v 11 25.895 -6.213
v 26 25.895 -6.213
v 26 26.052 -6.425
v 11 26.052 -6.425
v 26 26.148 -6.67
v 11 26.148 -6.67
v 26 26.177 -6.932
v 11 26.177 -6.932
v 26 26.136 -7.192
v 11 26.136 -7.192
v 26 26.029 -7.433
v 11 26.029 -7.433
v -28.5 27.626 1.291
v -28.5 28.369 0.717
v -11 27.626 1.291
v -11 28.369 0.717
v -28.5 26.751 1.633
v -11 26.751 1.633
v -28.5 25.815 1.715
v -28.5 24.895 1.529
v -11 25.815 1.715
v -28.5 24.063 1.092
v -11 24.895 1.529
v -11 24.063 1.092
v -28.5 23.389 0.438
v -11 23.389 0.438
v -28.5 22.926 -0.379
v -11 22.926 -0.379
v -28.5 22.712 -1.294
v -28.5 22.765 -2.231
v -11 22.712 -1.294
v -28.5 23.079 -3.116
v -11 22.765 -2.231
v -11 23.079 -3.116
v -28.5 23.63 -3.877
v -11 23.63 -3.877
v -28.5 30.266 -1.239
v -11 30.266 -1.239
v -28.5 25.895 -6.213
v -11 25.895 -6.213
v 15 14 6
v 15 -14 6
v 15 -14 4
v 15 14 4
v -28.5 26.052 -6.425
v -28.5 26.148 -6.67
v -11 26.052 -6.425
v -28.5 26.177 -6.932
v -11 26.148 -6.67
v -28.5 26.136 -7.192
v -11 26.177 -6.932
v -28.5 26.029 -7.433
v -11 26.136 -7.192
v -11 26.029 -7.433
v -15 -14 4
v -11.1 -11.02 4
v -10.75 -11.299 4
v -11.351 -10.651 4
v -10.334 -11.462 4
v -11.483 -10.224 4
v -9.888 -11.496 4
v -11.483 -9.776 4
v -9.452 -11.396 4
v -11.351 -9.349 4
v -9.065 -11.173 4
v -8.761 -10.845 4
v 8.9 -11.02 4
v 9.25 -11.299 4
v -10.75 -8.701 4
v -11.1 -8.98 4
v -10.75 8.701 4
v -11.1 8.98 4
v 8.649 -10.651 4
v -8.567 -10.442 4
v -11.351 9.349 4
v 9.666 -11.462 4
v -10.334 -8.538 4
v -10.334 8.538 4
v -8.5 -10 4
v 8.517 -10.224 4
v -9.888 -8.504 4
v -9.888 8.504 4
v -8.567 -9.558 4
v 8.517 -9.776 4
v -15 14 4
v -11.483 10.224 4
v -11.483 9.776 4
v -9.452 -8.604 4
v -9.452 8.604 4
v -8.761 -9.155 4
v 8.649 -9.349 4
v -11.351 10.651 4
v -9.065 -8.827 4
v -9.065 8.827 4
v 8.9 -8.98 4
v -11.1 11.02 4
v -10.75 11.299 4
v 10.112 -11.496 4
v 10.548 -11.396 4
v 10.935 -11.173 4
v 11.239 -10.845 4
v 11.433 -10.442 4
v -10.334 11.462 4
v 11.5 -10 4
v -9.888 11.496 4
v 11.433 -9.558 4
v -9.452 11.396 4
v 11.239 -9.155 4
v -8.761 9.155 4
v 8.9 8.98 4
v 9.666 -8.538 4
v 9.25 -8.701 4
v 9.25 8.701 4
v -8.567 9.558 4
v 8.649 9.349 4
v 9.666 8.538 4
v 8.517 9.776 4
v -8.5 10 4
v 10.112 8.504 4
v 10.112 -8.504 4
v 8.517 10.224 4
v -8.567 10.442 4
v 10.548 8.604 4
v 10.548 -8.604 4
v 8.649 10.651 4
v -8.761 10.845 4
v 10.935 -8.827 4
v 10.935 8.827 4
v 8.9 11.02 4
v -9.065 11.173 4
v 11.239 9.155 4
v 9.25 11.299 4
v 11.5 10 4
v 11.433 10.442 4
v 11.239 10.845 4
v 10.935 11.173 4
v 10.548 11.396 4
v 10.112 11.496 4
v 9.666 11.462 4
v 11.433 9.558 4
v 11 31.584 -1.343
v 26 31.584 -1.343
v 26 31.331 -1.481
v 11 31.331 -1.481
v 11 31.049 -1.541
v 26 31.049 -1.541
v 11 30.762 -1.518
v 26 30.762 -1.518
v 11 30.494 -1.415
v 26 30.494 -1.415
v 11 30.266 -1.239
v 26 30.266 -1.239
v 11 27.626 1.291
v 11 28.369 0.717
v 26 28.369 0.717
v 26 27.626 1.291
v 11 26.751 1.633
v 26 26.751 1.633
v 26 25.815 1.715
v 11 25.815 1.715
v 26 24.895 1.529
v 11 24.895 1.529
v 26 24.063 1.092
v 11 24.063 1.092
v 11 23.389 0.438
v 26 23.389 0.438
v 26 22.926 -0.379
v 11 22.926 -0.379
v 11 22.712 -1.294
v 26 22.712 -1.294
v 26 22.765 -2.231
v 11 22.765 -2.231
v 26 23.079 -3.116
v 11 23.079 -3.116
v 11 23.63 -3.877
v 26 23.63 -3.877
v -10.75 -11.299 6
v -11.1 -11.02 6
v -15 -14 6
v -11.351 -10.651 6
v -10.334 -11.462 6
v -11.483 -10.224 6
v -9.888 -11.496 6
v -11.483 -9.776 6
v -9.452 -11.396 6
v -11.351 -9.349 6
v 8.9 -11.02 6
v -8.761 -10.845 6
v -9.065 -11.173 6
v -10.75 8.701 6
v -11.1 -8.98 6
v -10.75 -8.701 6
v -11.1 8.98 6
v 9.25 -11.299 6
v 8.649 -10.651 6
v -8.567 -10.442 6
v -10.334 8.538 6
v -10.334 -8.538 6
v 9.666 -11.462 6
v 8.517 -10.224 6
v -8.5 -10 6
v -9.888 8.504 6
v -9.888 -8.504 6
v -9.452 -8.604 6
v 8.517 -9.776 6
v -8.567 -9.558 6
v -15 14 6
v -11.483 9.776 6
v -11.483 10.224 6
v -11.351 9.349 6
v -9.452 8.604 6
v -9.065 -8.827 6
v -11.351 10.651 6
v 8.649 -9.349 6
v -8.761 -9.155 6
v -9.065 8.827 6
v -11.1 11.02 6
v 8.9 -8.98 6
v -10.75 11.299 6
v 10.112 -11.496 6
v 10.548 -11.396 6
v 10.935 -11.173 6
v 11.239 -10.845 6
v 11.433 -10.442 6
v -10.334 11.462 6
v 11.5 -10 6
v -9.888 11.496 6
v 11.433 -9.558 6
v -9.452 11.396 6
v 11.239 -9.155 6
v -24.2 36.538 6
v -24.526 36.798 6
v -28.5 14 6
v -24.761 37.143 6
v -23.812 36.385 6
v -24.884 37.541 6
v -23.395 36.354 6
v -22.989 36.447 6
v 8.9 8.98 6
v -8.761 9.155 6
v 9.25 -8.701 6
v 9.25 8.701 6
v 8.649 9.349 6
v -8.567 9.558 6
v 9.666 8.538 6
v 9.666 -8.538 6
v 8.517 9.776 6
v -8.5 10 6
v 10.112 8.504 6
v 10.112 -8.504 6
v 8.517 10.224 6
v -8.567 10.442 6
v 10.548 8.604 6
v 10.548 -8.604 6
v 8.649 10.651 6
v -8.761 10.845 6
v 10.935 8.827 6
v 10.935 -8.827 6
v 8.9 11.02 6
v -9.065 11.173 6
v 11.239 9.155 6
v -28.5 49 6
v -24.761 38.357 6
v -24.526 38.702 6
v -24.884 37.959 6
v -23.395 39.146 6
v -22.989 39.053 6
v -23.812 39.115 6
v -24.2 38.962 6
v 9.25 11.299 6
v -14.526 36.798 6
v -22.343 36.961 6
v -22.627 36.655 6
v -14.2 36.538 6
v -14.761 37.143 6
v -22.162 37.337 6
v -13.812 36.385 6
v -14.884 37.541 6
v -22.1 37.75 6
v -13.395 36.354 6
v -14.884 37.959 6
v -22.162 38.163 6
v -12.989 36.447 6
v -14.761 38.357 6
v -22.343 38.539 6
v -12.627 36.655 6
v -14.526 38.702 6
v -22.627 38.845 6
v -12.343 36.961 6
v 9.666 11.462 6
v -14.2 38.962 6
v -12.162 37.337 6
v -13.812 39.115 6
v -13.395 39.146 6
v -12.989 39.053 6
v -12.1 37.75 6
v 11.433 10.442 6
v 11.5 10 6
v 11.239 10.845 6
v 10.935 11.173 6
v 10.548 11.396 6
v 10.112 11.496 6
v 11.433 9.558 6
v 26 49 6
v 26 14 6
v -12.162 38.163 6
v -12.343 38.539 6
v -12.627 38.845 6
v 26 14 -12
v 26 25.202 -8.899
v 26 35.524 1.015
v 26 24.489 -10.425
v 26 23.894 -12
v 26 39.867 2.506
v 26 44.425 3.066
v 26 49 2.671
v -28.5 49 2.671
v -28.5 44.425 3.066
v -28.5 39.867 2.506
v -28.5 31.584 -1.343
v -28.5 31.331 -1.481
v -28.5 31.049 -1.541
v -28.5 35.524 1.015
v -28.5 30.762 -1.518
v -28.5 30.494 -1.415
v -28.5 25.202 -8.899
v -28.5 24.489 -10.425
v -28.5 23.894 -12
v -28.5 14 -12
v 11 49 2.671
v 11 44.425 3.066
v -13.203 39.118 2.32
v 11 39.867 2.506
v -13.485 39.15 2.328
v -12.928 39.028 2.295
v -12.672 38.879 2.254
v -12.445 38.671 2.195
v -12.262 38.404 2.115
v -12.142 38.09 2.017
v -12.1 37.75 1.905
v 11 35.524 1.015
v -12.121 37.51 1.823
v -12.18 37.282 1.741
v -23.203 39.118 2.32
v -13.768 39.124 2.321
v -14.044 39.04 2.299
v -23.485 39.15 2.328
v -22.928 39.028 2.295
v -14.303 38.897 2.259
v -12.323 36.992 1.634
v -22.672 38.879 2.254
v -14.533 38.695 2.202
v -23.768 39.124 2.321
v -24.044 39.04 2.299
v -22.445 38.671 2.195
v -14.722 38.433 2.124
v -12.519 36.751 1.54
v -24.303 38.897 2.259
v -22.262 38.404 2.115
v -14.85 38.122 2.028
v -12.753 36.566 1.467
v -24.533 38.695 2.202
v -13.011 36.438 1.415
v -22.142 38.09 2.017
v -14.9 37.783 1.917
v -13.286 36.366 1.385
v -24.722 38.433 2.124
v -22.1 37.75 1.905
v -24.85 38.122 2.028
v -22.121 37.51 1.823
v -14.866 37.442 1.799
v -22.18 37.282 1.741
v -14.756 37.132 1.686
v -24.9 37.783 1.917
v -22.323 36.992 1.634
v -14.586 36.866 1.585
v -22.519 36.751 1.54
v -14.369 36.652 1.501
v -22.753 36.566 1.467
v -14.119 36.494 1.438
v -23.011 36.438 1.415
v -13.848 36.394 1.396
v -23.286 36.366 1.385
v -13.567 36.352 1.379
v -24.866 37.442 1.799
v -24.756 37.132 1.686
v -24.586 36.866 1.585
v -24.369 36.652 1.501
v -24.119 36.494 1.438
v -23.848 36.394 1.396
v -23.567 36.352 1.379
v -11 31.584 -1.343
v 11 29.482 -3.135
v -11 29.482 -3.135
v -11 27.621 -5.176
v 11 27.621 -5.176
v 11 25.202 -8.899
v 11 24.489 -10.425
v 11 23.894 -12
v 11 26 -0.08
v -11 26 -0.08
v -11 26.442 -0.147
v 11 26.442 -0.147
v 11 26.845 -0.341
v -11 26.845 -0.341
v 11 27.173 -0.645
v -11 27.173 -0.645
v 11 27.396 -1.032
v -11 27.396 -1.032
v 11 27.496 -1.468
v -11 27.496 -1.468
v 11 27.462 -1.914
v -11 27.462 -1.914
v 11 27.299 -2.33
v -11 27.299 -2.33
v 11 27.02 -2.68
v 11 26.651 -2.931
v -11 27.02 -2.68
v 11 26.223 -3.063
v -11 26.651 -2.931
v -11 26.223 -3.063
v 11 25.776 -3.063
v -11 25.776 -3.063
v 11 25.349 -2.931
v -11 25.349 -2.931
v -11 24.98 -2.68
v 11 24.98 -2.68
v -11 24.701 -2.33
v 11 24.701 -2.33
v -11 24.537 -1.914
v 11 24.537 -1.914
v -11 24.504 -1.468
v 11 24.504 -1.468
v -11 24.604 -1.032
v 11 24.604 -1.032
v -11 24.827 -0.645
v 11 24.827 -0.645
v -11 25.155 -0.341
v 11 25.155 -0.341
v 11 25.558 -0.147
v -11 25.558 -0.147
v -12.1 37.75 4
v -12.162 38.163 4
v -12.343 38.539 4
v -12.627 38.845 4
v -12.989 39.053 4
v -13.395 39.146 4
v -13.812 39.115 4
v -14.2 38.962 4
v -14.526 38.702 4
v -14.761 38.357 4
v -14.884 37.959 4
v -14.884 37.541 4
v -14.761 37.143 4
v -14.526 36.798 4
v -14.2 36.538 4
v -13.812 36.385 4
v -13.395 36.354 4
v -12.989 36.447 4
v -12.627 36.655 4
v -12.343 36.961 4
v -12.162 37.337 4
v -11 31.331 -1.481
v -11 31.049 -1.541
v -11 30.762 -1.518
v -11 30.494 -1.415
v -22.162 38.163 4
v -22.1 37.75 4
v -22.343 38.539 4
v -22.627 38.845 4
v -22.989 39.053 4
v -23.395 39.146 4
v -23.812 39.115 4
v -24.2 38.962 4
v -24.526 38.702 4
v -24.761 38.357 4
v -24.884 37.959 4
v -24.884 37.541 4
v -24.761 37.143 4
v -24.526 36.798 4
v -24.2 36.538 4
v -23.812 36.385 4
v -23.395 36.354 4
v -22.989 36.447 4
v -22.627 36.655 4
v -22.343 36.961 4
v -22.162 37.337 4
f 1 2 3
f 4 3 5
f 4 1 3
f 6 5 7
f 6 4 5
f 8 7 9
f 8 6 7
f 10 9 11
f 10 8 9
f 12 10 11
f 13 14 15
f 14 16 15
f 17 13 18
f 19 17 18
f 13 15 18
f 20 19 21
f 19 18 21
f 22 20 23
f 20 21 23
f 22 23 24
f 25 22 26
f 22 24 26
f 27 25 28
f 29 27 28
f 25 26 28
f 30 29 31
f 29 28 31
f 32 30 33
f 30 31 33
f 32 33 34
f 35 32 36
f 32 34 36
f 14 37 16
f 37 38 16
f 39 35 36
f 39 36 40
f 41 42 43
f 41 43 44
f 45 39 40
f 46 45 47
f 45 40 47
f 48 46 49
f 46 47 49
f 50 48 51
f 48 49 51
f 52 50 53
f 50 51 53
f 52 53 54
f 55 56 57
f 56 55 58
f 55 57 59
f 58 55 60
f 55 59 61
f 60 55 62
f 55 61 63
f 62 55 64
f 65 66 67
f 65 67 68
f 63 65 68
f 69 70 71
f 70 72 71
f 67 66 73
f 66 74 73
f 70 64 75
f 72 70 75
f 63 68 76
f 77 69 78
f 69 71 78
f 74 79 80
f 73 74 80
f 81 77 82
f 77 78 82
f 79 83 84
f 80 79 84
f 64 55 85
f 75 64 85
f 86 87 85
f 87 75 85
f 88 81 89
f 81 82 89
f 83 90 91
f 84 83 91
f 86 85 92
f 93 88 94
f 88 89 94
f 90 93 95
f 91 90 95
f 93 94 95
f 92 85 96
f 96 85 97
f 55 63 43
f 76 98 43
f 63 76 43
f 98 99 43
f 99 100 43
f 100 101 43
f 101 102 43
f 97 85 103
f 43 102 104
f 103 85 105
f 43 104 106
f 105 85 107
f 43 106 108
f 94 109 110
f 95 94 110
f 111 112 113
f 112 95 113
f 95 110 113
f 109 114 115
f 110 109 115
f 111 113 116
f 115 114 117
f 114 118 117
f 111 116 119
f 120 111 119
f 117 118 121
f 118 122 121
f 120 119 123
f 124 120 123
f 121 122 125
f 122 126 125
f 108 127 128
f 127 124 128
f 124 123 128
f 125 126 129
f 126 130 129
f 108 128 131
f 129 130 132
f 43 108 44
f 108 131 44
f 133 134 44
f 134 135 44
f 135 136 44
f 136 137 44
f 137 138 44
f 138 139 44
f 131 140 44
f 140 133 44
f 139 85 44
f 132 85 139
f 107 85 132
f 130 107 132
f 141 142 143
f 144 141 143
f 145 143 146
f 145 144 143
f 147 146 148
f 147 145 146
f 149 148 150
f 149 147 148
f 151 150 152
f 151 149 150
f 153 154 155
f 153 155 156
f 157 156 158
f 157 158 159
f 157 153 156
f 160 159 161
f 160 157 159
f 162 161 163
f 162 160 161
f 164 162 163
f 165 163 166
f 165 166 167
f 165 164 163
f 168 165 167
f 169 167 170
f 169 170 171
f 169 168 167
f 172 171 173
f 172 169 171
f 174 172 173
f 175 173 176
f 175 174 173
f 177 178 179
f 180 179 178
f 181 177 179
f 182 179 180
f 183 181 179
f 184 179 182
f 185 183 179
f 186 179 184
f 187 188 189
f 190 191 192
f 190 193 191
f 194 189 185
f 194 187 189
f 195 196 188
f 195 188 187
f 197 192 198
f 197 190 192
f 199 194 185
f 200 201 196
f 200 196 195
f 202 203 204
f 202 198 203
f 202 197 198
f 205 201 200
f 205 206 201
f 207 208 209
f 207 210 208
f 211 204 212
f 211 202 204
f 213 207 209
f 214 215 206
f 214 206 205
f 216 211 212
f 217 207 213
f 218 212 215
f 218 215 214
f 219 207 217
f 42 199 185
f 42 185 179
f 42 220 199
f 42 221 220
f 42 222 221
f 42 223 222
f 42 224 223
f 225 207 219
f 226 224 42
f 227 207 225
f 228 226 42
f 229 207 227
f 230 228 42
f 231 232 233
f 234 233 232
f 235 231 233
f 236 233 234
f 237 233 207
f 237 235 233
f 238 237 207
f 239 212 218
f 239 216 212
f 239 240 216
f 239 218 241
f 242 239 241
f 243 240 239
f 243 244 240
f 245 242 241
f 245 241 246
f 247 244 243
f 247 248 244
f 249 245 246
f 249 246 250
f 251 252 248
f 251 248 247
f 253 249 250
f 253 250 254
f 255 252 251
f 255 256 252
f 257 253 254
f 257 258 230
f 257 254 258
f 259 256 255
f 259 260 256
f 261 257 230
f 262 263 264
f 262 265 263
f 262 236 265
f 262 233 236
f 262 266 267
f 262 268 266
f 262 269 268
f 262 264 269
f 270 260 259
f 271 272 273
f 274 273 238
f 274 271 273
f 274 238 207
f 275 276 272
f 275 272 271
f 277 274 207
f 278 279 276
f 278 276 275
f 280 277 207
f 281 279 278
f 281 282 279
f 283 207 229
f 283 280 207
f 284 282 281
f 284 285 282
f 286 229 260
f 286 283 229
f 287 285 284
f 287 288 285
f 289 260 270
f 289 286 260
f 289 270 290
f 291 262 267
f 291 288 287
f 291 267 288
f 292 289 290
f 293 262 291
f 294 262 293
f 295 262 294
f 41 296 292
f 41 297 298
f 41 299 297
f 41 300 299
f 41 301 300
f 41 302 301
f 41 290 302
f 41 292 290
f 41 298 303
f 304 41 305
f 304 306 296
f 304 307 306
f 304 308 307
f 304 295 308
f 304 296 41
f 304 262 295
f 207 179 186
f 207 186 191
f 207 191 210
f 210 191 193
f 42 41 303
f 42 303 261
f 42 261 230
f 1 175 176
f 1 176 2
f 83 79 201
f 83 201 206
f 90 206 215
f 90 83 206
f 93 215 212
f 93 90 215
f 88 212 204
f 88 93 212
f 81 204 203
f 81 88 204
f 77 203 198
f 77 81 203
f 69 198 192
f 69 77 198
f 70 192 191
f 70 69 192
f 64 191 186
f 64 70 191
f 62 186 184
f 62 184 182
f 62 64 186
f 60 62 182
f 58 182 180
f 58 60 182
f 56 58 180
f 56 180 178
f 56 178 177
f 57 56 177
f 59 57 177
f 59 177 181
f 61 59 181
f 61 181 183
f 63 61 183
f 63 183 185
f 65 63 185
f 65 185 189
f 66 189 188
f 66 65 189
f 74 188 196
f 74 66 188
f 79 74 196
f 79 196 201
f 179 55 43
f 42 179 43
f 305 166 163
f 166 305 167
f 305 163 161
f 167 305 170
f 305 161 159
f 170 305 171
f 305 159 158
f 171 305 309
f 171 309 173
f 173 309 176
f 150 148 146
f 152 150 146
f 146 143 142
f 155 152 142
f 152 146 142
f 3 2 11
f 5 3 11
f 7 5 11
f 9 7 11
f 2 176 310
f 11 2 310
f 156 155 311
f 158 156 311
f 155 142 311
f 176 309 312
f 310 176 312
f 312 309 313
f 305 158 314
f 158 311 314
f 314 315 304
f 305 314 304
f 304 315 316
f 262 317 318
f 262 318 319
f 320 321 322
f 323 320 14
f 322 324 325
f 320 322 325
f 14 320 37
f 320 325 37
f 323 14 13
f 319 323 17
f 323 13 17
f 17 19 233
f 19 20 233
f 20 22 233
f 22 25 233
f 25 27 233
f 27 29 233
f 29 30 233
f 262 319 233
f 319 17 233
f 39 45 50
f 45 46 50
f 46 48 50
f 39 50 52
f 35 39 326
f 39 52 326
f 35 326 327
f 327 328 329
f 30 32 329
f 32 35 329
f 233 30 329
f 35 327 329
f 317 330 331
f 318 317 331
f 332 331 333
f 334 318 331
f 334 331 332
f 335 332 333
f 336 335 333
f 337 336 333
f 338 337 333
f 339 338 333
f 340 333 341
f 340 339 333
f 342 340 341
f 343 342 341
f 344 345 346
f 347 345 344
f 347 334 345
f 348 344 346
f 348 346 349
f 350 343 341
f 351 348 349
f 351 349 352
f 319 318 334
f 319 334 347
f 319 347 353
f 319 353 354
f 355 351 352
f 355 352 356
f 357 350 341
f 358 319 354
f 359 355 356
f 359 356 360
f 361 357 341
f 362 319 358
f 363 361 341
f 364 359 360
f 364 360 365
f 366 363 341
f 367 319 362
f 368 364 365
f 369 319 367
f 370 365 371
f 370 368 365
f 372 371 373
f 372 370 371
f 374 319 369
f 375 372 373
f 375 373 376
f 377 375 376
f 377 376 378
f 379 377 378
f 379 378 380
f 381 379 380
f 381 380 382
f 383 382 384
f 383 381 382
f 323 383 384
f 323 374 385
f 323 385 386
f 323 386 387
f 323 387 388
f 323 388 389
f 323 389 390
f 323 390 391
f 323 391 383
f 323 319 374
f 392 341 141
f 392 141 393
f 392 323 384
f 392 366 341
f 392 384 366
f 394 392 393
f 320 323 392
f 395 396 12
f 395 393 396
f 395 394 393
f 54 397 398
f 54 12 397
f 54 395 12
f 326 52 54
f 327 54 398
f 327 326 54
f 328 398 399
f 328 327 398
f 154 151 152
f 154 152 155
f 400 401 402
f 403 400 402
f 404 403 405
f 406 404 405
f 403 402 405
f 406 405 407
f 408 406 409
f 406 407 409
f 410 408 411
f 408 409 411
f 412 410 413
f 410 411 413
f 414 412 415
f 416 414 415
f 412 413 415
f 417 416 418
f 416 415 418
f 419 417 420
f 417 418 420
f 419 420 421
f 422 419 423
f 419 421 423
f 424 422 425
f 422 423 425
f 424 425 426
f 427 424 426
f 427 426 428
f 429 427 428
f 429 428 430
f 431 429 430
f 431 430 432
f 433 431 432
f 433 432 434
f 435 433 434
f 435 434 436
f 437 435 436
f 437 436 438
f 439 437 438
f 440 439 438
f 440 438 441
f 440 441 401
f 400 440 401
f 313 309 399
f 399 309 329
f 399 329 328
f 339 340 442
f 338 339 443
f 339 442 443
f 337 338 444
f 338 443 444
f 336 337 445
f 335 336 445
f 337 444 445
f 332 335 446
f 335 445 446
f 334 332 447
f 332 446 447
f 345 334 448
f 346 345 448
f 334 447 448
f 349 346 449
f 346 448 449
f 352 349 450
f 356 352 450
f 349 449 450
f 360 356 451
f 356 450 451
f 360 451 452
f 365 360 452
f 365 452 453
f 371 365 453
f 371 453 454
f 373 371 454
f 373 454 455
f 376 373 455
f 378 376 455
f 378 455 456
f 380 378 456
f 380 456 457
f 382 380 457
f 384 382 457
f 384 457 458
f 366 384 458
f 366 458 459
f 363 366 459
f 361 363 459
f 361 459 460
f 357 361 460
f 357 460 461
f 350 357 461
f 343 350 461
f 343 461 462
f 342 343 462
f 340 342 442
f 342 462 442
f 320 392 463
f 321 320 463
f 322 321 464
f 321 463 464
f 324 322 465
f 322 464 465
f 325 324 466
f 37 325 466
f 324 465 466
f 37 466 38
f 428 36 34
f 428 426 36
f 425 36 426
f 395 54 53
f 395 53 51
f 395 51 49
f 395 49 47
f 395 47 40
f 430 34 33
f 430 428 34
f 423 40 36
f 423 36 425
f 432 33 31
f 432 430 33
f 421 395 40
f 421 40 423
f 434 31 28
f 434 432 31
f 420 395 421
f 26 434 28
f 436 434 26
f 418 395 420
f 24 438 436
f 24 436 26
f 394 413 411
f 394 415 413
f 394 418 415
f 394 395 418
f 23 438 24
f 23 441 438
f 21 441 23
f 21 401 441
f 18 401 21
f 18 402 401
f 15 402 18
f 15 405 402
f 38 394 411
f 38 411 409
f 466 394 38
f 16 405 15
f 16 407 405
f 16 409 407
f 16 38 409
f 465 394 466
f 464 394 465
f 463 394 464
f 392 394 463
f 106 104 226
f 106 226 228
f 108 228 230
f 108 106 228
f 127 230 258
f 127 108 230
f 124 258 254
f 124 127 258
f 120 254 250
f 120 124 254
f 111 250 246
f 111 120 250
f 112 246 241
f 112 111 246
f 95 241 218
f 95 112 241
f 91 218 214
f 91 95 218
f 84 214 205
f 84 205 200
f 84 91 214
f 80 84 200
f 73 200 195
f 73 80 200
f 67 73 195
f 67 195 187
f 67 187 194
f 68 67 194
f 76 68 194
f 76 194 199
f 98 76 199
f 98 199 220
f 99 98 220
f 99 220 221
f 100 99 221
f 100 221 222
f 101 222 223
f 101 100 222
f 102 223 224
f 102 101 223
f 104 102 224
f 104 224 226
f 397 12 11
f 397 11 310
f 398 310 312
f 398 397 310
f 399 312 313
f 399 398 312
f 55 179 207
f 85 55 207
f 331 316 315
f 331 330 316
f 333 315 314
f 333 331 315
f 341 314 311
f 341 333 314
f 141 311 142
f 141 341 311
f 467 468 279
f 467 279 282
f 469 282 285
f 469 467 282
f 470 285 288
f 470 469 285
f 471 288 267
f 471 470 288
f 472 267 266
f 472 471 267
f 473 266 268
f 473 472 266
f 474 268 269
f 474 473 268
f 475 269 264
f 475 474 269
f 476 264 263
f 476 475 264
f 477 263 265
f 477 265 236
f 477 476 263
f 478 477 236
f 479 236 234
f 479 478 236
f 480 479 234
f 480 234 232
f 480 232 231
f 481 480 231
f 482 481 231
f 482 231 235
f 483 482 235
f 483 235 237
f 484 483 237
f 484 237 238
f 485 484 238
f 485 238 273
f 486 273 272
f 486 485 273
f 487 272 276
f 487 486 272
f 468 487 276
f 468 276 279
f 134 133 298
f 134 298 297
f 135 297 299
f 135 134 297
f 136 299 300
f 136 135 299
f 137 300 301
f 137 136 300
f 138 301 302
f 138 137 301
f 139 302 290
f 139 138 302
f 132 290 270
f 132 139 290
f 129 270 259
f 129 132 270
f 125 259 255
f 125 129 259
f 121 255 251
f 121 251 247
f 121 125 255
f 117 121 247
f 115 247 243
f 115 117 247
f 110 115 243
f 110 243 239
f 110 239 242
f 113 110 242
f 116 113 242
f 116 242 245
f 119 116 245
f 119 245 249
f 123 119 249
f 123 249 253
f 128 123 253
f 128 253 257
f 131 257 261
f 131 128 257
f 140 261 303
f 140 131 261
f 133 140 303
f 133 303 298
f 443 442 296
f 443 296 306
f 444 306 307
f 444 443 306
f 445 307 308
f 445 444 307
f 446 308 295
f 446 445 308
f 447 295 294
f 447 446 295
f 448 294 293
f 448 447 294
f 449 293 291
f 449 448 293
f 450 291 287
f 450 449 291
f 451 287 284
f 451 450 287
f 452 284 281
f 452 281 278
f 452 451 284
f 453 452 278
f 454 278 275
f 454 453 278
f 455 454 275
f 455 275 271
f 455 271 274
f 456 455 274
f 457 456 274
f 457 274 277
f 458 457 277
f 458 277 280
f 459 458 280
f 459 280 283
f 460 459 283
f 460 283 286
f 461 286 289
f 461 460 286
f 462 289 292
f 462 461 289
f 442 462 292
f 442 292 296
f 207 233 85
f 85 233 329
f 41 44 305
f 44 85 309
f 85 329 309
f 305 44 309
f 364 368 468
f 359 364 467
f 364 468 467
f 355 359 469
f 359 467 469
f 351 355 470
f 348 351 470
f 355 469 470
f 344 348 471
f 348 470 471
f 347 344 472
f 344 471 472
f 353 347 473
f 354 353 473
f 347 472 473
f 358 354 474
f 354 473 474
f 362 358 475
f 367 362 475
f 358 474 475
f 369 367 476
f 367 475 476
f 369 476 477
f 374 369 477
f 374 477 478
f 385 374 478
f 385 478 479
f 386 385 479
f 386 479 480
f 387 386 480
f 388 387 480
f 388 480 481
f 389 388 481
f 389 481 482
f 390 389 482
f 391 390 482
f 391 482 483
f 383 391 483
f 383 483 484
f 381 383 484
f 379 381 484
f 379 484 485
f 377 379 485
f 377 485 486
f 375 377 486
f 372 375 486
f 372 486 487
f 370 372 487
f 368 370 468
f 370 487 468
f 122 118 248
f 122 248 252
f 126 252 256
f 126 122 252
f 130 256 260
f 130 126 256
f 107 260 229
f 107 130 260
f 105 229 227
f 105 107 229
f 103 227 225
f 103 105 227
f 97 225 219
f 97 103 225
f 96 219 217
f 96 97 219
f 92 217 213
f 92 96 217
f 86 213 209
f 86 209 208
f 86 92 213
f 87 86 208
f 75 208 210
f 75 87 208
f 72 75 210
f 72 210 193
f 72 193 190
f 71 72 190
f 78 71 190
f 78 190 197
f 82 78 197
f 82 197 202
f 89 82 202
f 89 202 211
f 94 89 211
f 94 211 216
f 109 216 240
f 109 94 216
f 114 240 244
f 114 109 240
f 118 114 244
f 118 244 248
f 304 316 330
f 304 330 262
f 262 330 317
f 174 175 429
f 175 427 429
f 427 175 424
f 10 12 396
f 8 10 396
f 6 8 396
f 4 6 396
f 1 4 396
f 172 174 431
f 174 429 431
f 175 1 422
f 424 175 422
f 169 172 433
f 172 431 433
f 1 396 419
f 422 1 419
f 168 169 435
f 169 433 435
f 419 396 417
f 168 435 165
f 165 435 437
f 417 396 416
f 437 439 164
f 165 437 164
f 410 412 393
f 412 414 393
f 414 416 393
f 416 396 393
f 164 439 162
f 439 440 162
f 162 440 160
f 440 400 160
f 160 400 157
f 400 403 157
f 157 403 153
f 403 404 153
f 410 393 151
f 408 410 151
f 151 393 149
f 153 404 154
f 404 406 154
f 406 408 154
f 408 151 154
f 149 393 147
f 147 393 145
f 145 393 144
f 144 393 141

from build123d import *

# Parameters (mm, degrees)
SKETCH1_R               = 1.500000001
SKETCH1_R_2             = 1.5
BOSS_EXTRUDE2_DEPTH     = 4
SKETCH1_4_W             = 32
SKETCH1_4_H             = 35
SKETCH1_4_R             = 6.100000001
BOSS_EXTRUDE3_DEPTH     = 20
SKETCH2_R               = 1.5
CUT_EXTRUDE3_DEPTH      = 1
CUT_EXTRUDE3_DEPTH_BACK = 33
CUT_EXTRUDE4_DEPTH      = 5
CUT_EXTRUDE5_START      = -32
CUT_EXTRUDE5_DEPTH      = 5
CUT_EXTRUDE6_DEPTH      = 25
BOSS_EXTRUDE5_DEPTH     = 12.5
SKETCH7_R               = 1.4
CUT_EXTRUDE7_DEPTH      = 20
BOSS_EXTRUDE6_START     = -32
BOSS_EXTRUDE6_DEPTH     = 10
CUT_EXTRUDE8_DEPTH      = 43
SKETCH9_R               = 1.4
SKETCH9_W               = 32
SKETCH9_H               = 28
SKETCH9_R_2             = 1.500000001
BOSS_EXTRUDE7_DEPTH     = 2
SKETCH1_8_W             = 32
SKETCH1_8_H             = 27.5
SKETCH1_8_R             = 1.500000001
SKETCH1_8_R_2           = 1.5
CUT_EXTRUDE9_DEPTH      = 4
SKETCH11_W              = 1
SKETCH11_H              = 28
CUT_EXTRUDE13_DEPTH     = 27
CUT_EXTRUDE10_DEPTH     = 55.5


with BuildPart() as part:
    # Sketch1 → Boss-Extrude2 (new body)
    with BuildSketch(Plane.XY):
        Polygon((-16, 49), (-16, -46.5), (-14.969293645, -46.5), (-14.969293645, -42.160880121), (-15.92820323, -40.5), (-12.464101615, -34.5), (-5.535898385, -34.5), (-2.07179677, -40.5), (-5.535898385, -46.5), (5.535898385, -46.5), (2.090853862, -40.533007852), (5.457729166, -34.432863746), (12.425340481, -34.432863746), (15.909146138, -40.466992148), (15, -42.114193768), (15, -46.5), (16, -46.5), (16, 49), align=None)
        with Locations((10, 10)):
            Circle(SKETCH1_R, mode=Mode.SUBTRACT)
        with Locations((-10, -10)):
            Circle(SKETCH1_R, mode=Mode.SUBTRACT)
        with Locations((10, -10)):
            Circle(SKETCH1_R, mode=Mode.SUBTRACT)
        with Locations((-10, 10)):
            Circle(SKETCH1_R, mode=Mode.SUBTRACT)
        with Locations((0, -43.5)):
            Circle(SKETCH1_R_2, mode=Mode.SUBTRACT)
        with Locations((-8.5, -31.5)):
            Circle(SKETCH1_R_2, mode=Mode.SUBTRACT)
        with Locations((8.5, -31.5)):
            Circle(SKETCH1_R_2, mode=Mode.SUBTRACT)
    extrude(amount=BOSS_EXTRUDE2_DEPTH)

    # Sketch1<4> → Boss-Extrude3 (add)
    with BuildSketch(Plane.XY):
        with Locations((0, 31.5)):
            Rectangle(SKETCH1_4_W, SKETCH1_4_H)
        Polygon((0, 36.969655115), (9.5, 31.484827557), (9.5, 20.515172443), (0, 15.030344885), (-9.5, 20.515172443), (-9.5, 31.484827557), align=None, mode=Mode.SUBTRACT)
        Polygon((9.5, 31.484827557), (9.5, 20.515172443), (0, 15.030344885), (-9.5, 20.515172443), (-9.5, 31.484827557), (0, 36.969655115), align=None)
        with Locations((0, 26)):
            Circle(SKETCH1_4_R, mode=Mode.SUBTRACT)
        with Locations((0, 26)):
            Circle(SKETCH1_4_R)
    extrude(amount=-BOSS_EXTRUDE3_DEPTH)

    # Sketch2 → Cut-Extrude3 (cut, two sides)
    with BuildSketch(Plane.ZY.offset(16)) as cut_extrude3_sk:
        with Locations((-1.580023732, 25.999827557)):
            Circle(SKETCH2_R)
    extrude(amount=CUT_EXTRUDE3_DEPTH, mode=Mode.SUBTRACT)
    extrude(cut_extrude3_sk.sketch, amount=-CUT_EXTRUDE3_DEPTH_BACK, mode=Mode.SUBTRACT)

    # Sketch3 → Cut-Extrude4 (cut)
    with BuildSketch(Plane.ZY.offset(16)):
        with BuildLine():
            Line((0.716979622, 28.369168308), (-1.239134605, 30.265561192))
            ThreePointArc((-1.239134605, 30.265561192), (-1.539975782, 30.904899692), (-1.343104133, 31.583501701))
            ThreePointArc((-1.343104133, 31.583501701), (2.506062966, 39.867185425), (2.670991263, 49))
            Line((2.670991263, 49), (-20, 49))
            Line((-20, 49), (-20, 22.778106647))
            ThreePointArc((-20, 22.778106647), (-13.472070231, 23.458477945), (-7.432949471, 26.028651597))
            ThreePointArc((-7.432949471, 26.028651597), (-6.799957072, 26.171029415), (-6.212814046, 25.894960789))
            Line((-6.212814046, 25.894960789), (-3.877027086, 23.630486807))
            Line((-3.877027086, 23.630486807), (0.716979622, 28.369168308))
        make_face()
        with BuildLine():
            ThreePointArc((-3.877027086, 23.630486807), (0.789317018, 23.702824203), (0.716979622, 28.369168308))
            Line((0.716979622, 28.369168308), (-3.877027086, 23.630486807))
        make_face()
    extrude(amount=-CUT_EXTRUDE4_DEPTH, mode=Mode.SUBTRACT)

    # Sketch3<4> → Cut-Extrude5 (cut)
    with BuildSketch(Plane.ZY.offset(16).offset(CUT_EXTRUDE5_START)):
        with BuildLine():
            Line((0.716979622, 28.369168308), (-1.239134605, 30.265561192))
            ThreePointArc((-1.239134605, 30.265561192), (-1.539975782, 30.904899692), (-1.343104133, 31.583501701))
            ThreePointArc((-1.343104133, 31.583501701), (2.506062966, 39.867185425), (2.670991263, 49))
            Line((2.670991263, 49), (-20, 49))
            Line((-20, 49), (-20, 22.778106647))
            ThreePointArc((-20, 22.778106647), (-13.472070231, 23.458477945), (-7.432949471, 26.028651597))
            ThreePointArc((-7.432949471, 26.028651597), (-6.799957072, 26.171029415), (-6.212814046, 25.894960789))
            Line((-6.212814046, 25.894960789), (-3.877027086, 23.630486807))
            Line((-3.877027086, 23.630486807), (0.716979622, 28.369168308))
        make_face()
        with BuildLine():
            ThreePointArc((-3.877027086, 23.630486807), (0.789317018, 23.702824203), (0.716979622, 28.369168308))
            Line((0.716979622, 28.369168308), (-3.877027086, 23.630486807))
        make_face()
    extrude(amount=CUT_EXTRUDE5_DEPTH, mode=Mode.SUBTRACT)

    # Sketch5 → Cut-Extrude6 (cut, through all)
    with BuildSketch(Plane.XY.offset(4)):
        Polygon((-14.969293645, -42.160880121), (-15.92820323, -40.5), (-16, -40.500074436), (-16, -46.5), (-14.969293645, -46.5), align=None)
        Polygon((15, -42.114193768), (15.909146138, -40.466992148), (10.36687247, -40.472738184), (10.36687247, -46.5), (15, -46.5), align=None)
        Polygon((16, -40.466897954), (15.909146138, -40.466992148), (15, -42.114193768), (15, -46.5), (16, -46.5), align=None)
        Polygon((17.825288522, -40.465005559), (16, -40.466897954), (16, -46.5), (17.916172301, -46.5), align=None)
    extrude(amount=-CUT_EXTRUDE6_DEPTH, mode=Mode.SUBTRACT)

    # Sketch8 → Boss-Extrude5 (add)
    with BuildSketch(Plane.ZY.offset(16)):
        with BuildLine():
            ThreePointArc((-1.343104133, 31.583501701), (-1.539975782, 30.904899692), (-1.239134605, 30.265561192))
            Line((-1.239134605, 30.265561192), (0.716979622, 28.369168308))
            ThreePointArc((0.716979622, 28.369168308), (0.789317018, 23.702824203), (-3.877027086, 23.630486807))
            Line((-3.877027086, 23.630486807), (-6.212814046, 25.894960789))
            ThreePointArc((-6.212814046, 25.894960789), (-6.799957072, 26.171029415), (-7.432949471, 26.028651597))
            ThreePointArc((-7.432949471, 26.028651597), (-13.472070231, 23.458477945), (-20, 22.778106647))
            Line((-20, 22.778106647), (-20, 14))
            Line((-20, 14), (0, 14))
            Line((0, 14), (4, 14))
            Line((4, 14), (4, 49))
            Line((4, 49), (2.670991263, 49))
            ThreePointArc((2.670991263, 49), (2.506062966, 39.867185425), (-1.343104133, 31.583501701))
        make_face()
    extrude(amount=BOSS_EXTRUDE5_DEPTH)

    # Sketch7 → Cut-Extrude7 (cut)
    with BuildSketch(Plane.XY.offset(4)):
        with Locations((-13.5, 37.75)):
            Circle(SKETCH7_R)
        with Locations((-23.5, 37.75)):
            Circle(SKETCH7_R)
    extrude(amount=-CUT_EXTRUDE7_DEPTH, mode=Mode.SUBTRACT)

    # Sketch8<3> → Boss-Extrude6 (add)
    with BuildSketch(Plane.ZY.offset(16).offset(BOSS_EXTRUDE6_START)):
        with BuildLine():
            ThreePointArc((-1.343104133, 31.583501701), (-1.539975782, 30.904899692), (-1.239134605, 30.265561192))
            Line((-1.239134605, 30.265561192), (0.716979622, 28.369168308))
            ThreePointArc((0.716979622, 28.369168308), (0.789317018, 23.702824203), (-3.877027086, 23.630486807))
            Line((-3.877027086, 23.630486807), (-6.212814046, 25.894960789))
            ThreePointArc((-6.212814046, 25.894960789), (-6.799957072, 26.171029415), (-7.432949471, 26.028651597))
            ThreePointArc((-7.432949471, 26.028651597), (-13.472070231, 23.458477945), (-20, 22.778106647))
            Line((-20, 22.778106647), (-20, 14))
            Line((-20, 14), (0, 14))
            Line((0, 14), (4, 14))
            Line((4, 14), (4, 49))
            Line((4, 49), (2.670991263, 49))
            ThreePointArc((2.670991263, 49), (2.506062966, 39.867185425), (-1.343104133, 31.583501701))
        make_face()
    extrude(amount=-BOSS_EXTRUDE6_DEPTH)

    # Sketch8<4> → Cut-Extrude8 (cut, through all)
    with BuildSketch(Plane.ZY.offset(16)):
        with BuildLine():
            ThreePointArc((-1.343104133, 31.583501701), (-4.126373378, 28.519223025), (-7.432949471, 26.028651597))
            ThreePointArc((-7.432949471, 26.028651597), (-13.472070231, 23.458477945), (-20, 22.778106647))
            Line((-20, 22.778106647), (-20, 49))
            Line((-20, 49), (2.670991263, 49))
            ThreePointArc((2.670991263, 49), (2.506062966, 39.867185425), (-1.343104133, 31.583501701))
        make_face()
    extrude(amount=-CUT_EXTRUDE8_DEPTH, mode=Mode.SUBTRACT)

    # Sketch9 → Boss-Extrude7 (add)
    with BuildSketch(Plane.XY.offset(4)):
        Polygon((26, 14), (26, 49), (-28.5, 49), (-28.5, 14), (-16, 14), (16, 14), align=None)
        with Locations((-23.5, 37.75)):
            Circle(SKETCH9_R, mode=Mode.SUBTRACT)
        with Locations((-13.5, 37.75)):
            Circle(SKETCH9_R, mode=Mode.SUBTRACT)
        Rectangle(SKETCH9_W, SKETCH9_H)
        with Locations((-10, -10)):
            Circle(SKETCH9_R_2, mode=Mode.SUBTRACT)
        with Locations((-10, 10)):
            Circle(SKETCH9_R_2, mode=Mode.SUBTRACT)
        with Locations((10, -10)):
            Circle(SKETCH9_R_2, mode=Mode.SUBTRACT)
        with Locations((10, 10)):
            Circle(SKETCH9_R_2, mode=Mode.SUBTRACT)
    extrude(amount=BOSS_EXTRUDE7_DEPTH)

    # Sketch1<8> → Cut-Extrude9 (cut)
    with BuildSketch(Plane.XY):
        with Locations((0, 0.25)):
            Rectangle(SKETCH1_8_W, SKETCH1_8_H)
        with Locations((-10, 10)):
            Circle(SKETCH1_8_R, mode=Mode.SUBTRACT)
        with Locations((10, 10)):
            Circle(SKETCH1_8_R, mode=Mode.SUBTRACT)
        with Locations((10, -10)):
            Circle(SKETCH1_8_R, mode=Mode.SUBTRACT)
        with Locations((-10, -10)):
            Circle(SKETCH1_8_R, mode=Mode.SUBTRACT)
        Polygon((15, -13.5), (-14.969293645, -13.5), (-14.969293645, -38.839119879), (-12.464101615, -34.5), (-5.535898385, -34.5), (-2.07179677, -40.5), (-5.535898385, -46.5), (5.535898385, -46.5), (2.090853862, -40.533007852), (5.457729166, -34.432863746), (12.425340481, -34.432863746), (15, -38.892304845), align=None)
        with Locations((-8.5, -31.5)):
            Circle(SKETCH1_8_R_2, mode=Mode.SUBTRACT)
        with Locations((0, -43.5)):
            Circle(SKETCH1_8_R_2, mode=Mode.SUBTRACT)
        with Locations((8.5, -31.5)):
            Circle(SKETCH1_8_R_2, mode=Mode.SUBTRACT)
        Polygon((-14.969293645, -13.5), (-16, -13.5), (-16, -46.5), (-14.969293645, -46.5), (-14.969293645, -42.160880121), (-15.92820323, -40.5), (-14.969293645, -38.839119879), align=None)
        Polygon((16, -46.5), (16, -13.5), (15, -13.5), (15, -38.892304845), (15.909146138, -40.466992148), (15, -42.114193768), (15, -46.5), align=None)
    extrude(amount=CUT_EXTRUDE9_DEPTH, mode=Mode.SUBTRACT)

    # Sketch11 → Cut-Extrude13 (cut, through all)
    with BuildSketch(Plane.XY.offset(6)):
        with Locations((-15.5, 0)):
            Rectangle(SKETCH11_W, SKETCH11_H)
        with Locations((15.5, 0)):
            Rectangle(SKETCH11_W, SKETCH11_H)
    extrude(amount=-CUT_EXTRUDE13_DEPTH, mode=Mode.SUBTRACT)

    # Sketch10 → Cut-Extrude10 (cut, through all)
    with BuildSketch(Plane.ZY.offset(28.5)):
        with BuildLine():
            ThreePointArc((-12, 23.89439883), (-15.948490895, 22.967108487), (-20, 22.778106647))
            Line((-20, 22.778106647), (-20, 14))
            Line((-20, 14), (-12, 14))
            Line((-12, 14), (-12, 23.89439883))
        make_face()
    extrude(amount=-CUT_EXTRUDE10_DEPTH, mode=Mode.SUBTRACT)


solid = part.part
